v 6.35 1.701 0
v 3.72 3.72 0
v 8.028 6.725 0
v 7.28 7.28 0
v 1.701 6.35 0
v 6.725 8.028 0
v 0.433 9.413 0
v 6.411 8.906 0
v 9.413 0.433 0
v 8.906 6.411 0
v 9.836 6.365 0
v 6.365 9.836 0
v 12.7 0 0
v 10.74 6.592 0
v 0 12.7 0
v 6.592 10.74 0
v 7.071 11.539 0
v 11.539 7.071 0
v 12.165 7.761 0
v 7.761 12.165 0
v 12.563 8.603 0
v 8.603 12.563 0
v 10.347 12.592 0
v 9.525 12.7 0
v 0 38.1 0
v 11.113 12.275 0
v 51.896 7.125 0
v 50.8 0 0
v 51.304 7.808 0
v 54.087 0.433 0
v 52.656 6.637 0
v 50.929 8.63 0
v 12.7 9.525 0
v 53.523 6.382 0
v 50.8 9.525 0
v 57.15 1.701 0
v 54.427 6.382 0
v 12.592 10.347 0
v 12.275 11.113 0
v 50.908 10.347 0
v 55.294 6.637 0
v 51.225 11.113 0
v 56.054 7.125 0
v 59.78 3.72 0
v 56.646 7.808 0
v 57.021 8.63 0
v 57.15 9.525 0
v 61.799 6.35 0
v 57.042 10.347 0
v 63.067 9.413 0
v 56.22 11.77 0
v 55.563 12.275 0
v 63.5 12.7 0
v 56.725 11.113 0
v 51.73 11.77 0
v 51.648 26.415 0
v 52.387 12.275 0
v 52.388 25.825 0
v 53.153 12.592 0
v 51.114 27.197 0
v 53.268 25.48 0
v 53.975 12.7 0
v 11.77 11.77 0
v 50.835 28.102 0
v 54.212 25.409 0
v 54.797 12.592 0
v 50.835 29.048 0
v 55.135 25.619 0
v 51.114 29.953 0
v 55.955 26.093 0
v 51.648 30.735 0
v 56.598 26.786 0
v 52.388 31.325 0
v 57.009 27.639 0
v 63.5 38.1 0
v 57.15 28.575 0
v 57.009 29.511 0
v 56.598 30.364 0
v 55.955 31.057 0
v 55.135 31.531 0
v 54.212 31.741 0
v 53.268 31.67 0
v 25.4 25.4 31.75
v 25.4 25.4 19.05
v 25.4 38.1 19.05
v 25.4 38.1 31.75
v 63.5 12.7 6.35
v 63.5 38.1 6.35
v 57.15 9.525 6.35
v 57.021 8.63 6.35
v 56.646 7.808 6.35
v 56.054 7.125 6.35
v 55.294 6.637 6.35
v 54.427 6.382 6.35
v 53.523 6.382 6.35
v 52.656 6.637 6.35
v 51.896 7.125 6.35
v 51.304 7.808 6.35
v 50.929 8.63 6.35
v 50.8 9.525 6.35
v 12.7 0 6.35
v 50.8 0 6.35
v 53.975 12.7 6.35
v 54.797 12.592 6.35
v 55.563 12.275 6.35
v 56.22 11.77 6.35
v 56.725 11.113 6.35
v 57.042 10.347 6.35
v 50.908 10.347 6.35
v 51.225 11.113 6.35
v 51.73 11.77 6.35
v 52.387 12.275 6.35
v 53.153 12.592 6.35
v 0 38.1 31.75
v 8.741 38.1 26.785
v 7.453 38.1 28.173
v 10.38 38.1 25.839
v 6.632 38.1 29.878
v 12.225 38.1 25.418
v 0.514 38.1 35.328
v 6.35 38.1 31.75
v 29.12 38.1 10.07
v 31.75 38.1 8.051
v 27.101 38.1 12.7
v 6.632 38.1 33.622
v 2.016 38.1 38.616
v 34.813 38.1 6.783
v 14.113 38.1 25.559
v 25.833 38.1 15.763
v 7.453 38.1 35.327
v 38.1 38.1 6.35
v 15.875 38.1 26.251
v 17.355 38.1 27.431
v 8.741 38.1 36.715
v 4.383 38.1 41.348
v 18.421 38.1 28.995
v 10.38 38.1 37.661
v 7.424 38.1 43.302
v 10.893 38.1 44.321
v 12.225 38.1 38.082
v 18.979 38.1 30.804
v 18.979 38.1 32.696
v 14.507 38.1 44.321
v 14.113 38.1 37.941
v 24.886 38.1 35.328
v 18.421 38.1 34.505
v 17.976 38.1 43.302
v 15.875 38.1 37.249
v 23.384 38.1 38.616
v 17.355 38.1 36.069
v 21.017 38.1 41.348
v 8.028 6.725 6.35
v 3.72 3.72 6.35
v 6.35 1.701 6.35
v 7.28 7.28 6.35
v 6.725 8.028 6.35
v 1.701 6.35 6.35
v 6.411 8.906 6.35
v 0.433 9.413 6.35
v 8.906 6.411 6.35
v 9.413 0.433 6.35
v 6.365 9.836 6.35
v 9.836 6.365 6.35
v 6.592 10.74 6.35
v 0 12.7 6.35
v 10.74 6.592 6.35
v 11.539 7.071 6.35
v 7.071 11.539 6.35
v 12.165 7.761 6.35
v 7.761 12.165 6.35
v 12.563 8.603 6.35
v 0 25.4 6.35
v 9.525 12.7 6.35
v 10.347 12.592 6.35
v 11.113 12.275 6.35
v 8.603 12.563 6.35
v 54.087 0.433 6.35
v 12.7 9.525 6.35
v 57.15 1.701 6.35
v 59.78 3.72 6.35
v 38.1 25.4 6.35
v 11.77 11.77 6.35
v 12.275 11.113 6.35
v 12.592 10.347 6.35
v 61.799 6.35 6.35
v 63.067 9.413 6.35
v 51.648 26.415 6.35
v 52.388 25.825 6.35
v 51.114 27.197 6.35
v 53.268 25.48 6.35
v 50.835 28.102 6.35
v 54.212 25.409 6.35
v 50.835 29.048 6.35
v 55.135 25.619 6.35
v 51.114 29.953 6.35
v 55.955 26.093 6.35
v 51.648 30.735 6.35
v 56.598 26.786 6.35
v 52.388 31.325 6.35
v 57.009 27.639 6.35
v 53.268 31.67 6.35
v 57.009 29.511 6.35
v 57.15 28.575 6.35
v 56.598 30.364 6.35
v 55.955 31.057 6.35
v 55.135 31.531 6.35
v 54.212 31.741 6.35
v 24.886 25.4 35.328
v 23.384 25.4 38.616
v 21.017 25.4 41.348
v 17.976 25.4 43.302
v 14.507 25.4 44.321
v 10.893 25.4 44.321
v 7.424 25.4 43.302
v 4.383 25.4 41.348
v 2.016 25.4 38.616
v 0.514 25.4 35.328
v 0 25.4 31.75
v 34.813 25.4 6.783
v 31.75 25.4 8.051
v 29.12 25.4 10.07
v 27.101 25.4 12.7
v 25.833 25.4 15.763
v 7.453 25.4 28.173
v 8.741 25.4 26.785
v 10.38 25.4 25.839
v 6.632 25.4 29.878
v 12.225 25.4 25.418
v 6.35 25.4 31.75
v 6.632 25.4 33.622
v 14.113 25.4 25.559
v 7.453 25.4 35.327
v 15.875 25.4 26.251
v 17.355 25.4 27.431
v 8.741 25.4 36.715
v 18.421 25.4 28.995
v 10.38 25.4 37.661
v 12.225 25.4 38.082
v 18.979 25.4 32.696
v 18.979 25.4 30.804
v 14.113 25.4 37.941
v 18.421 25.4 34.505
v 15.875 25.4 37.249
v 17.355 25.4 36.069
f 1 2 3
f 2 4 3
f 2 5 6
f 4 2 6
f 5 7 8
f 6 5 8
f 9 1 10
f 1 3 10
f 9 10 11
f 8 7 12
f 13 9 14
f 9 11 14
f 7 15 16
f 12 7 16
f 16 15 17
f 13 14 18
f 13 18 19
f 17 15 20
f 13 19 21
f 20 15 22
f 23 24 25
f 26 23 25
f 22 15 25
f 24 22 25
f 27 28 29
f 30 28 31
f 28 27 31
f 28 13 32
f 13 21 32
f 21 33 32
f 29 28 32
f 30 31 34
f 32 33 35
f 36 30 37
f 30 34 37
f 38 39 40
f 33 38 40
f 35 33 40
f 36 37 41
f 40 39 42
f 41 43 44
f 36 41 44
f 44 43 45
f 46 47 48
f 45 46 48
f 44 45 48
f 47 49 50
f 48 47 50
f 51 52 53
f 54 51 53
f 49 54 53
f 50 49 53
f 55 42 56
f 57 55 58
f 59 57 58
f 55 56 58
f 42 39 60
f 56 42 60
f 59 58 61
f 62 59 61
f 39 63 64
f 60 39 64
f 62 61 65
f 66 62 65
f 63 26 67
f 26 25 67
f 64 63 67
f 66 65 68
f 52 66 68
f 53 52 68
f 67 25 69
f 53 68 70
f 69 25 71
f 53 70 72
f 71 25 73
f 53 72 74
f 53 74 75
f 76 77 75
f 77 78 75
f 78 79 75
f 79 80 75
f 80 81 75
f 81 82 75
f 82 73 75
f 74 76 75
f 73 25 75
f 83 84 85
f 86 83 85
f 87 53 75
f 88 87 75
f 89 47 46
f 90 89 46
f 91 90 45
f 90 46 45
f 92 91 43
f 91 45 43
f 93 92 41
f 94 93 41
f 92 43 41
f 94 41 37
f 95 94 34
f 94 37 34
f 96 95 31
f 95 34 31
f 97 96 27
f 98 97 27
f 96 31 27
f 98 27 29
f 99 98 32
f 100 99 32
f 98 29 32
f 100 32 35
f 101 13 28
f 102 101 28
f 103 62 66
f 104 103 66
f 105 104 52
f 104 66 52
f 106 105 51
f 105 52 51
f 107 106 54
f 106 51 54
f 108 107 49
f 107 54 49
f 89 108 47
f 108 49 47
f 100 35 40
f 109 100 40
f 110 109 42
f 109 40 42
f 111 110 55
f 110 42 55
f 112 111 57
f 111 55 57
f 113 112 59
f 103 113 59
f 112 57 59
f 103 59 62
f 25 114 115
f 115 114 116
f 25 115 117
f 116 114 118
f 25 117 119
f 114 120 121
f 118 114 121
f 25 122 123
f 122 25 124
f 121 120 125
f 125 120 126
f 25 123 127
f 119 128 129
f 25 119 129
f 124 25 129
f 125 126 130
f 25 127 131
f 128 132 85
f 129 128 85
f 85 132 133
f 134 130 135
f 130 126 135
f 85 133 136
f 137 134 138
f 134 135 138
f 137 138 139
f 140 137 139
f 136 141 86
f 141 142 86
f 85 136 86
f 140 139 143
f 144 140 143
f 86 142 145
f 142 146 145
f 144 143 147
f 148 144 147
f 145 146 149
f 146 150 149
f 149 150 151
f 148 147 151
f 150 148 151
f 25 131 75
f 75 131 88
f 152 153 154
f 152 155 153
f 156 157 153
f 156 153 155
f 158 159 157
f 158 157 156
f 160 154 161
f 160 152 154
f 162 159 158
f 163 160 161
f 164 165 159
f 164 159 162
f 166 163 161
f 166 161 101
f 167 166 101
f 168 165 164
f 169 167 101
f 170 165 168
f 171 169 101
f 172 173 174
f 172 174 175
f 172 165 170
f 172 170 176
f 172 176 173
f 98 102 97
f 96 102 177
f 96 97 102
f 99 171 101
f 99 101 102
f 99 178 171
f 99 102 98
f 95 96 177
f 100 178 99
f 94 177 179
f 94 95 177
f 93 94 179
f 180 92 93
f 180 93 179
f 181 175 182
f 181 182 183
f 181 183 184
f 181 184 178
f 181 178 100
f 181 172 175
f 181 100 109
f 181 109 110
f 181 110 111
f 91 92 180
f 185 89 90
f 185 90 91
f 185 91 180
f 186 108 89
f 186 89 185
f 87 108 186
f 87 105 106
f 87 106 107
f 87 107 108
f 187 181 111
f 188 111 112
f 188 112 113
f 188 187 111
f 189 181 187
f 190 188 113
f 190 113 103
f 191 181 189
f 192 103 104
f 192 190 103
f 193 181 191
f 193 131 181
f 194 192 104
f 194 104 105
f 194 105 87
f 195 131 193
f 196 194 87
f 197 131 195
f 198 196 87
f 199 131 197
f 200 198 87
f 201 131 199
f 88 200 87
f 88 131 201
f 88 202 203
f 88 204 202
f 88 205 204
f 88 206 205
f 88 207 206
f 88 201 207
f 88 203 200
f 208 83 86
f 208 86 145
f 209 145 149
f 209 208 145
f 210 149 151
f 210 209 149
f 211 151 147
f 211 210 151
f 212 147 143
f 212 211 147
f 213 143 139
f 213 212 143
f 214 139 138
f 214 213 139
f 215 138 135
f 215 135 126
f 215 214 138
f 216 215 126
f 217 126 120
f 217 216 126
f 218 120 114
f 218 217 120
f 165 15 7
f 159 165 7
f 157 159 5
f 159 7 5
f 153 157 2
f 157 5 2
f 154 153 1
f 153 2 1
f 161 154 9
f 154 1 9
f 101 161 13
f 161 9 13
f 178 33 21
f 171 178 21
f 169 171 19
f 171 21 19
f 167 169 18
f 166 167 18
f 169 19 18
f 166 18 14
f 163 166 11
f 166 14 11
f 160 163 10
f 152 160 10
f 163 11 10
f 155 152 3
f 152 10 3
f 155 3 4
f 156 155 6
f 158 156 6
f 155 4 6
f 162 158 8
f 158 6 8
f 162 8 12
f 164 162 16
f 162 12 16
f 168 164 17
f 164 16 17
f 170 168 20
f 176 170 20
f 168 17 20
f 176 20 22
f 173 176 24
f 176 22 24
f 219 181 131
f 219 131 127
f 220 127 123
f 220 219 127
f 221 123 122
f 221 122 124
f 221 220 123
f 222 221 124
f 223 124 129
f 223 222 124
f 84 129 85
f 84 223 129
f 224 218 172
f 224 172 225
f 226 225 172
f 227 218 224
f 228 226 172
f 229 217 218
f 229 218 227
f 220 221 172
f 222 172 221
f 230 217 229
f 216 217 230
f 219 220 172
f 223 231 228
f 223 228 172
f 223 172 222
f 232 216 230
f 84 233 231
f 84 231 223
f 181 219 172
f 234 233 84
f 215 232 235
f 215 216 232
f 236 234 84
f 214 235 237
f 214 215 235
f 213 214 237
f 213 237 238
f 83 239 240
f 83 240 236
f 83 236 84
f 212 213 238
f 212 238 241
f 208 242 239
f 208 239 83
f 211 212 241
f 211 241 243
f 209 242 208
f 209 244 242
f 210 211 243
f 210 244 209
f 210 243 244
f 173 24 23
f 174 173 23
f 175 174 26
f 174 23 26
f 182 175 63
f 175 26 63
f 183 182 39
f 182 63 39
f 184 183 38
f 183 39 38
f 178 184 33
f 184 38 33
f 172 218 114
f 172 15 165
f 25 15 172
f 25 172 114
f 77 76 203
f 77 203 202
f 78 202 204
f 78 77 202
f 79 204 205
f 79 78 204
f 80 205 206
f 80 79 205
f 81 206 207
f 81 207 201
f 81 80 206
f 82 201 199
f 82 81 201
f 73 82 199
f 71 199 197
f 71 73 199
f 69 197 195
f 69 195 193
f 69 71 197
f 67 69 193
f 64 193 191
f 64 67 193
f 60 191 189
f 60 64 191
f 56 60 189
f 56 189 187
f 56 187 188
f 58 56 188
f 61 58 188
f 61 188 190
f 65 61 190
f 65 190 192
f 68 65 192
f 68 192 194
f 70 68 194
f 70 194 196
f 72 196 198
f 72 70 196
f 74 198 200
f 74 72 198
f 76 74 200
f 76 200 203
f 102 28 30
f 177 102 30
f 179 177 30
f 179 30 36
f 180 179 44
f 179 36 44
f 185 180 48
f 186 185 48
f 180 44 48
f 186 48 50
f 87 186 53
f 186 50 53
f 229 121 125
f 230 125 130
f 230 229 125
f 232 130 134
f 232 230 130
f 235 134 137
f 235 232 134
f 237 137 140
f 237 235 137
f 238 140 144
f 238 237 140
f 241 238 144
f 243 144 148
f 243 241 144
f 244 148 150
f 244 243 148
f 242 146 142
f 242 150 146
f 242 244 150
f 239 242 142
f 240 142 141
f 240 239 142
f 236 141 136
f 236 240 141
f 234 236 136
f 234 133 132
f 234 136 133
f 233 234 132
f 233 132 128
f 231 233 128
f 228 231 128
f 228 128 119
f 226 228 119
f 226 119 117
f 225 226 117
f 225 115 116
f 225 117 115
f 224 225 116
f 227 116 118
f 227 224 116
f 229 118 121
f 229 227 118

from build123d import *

# Parameters (mm, degrees)
F0_R     = 3.175
F1_DEPTH = 6.35
F0_W     = 25.4
F0_H     = 12.7
F2_DEPTH = 31.75
F4_DEPTH = 12.7
F5_DEPTH = 12.7
F6_DEPTH = 12.7
F7_DEPTH = 6.35


with BuildPart() as f1:
    # F0 (on Top) → F1 (new body)
    with BuildSketch(Plane.XY):
        Polygon((0, 25.4), (0, 12.7), (9.525, 12.7), (12.7, 12.7), (12.7, 9.525), (12.7, 0), (50.8, 0), (50.8, 9.525), (50.8, 12.7), (53.975, 12.7), (63.5, 12.7), (63.5, 38.1), (25.4, 38.1), (25.4, 25.4), align=None)
        with Locations((53.975, 28.575)):
            Circle(F0_R, mode=Mode.SUBTRACT)
        with BuildLine():
            Line((50.8, 9.525), (50.8, 0))
            ThreePointArc((50.8, 0), (59.7802561211, 3.7197438789), (63.5, 12.7))
            Line((63.5, 12.7), (53.975, 12.7))
            ThreePointArc((53.975, 12.7), (56.2200640303, 11.7700640303), (57.15, 9.525))
            ThreePointArc((57.15, 9.525), (53.975, 6.35), (50.8, 9.525))
        make_face()
        with BuildLine():
            Line((9.525, 12.7), (0, 12.7))
            ThreePointArc((0, 12.7), (3.7197438789, 3.7197438789), (12.7, 0))
            Line((12.7, 0), (12.7, 9.525))
            ThreePointArc((12.7, 9.525), (7.2799359697, 7.2799359697), (9.525, 12.7))
        make_face()
    extrude(amount=F1_DEPTH)

    # F0 (on Top) → F2 (join)
    with BuildSketch(Plane.XY):
        with Locations((12.7, 31.75)):
            Rectangle(F0_W, F0_H)
    extrude(amount=F2_DEPTH)

    # F3 (on face) → F4 (join)
    with BuildSketch(Plane.XZ.offset(-25.4)):
        with BuildLine():
            ThreePointArc((38.1, 6.35), (29.1197438789, 10.0697438789), (25.4, 19.05))
            Line((25.4, 19.05), (25.4, 6.35))
            Line((25.4, 6.35), (38.1, 6.35))
        make_face()
    extrude(amount=-F4_DEPTH)

    # F3 (on face) → F5 (cut)
    with BuildSketch(Plane.XZ.offset(-25.4)):
        with BuildLine():
            Line((6.35, 31.75), (19.05, 31.75))
            ThreePointArc((19.05, 31.75), (12.7, 38.1), (6.35, 31.75))
        make_face()
        with BuildLine():
            ThreePointArc((6.35, 31.75), (12.7, 25.4), (19.05, 31.75))
            Line((19.05, 31.75), (6.35, 31.75))
        make_face()
    extrude(amount=-F5_DEPTH, mode=Mode.SUBTRACT)

    # F3 (on face) → F6 (join)
    with BuildSketch(Plane.XZ.offset(-25.4)):
        with BuildLine():
            Line((19.05, 31.75), (25.4, 31.75))
            ThreePointArc((25.4, 31.75), (12.7, 44.45), (0, 31.75))
            Line((0, 31.75), (6.35, 31.75))
            ThreePointArc((6.35, 31.75), (12.7, 38.1), (19.05, 31.75))
        make_face()
    extrude(amount=-F6_DEPTH)

    # F0 (on Top) → F7 (join)
    with BuildSketch(Plane.XY):
        with BuildLine():
            Line((12.7, 12.7), (9.525, 12.7))
            ThreePointArc((9.525, 12.7), (11.7700640303, 11.7700640303), (12.7, 9.525))
            Line((12.7, 9.525), (12.7, 12.7))
        make_face()
        with BuildLine():
            Line((50.8, 12.7), (50.8, 9.525))
            ThreePointArc((50.8, 9.525), (51.7299359697, 11.7700640303), (53.975, 12.7))
            Line((53.975, 12.7), (50.8, 12.7))
        make_face()
    extrude(amount=F7_DEPTH)


solid = f1.part
